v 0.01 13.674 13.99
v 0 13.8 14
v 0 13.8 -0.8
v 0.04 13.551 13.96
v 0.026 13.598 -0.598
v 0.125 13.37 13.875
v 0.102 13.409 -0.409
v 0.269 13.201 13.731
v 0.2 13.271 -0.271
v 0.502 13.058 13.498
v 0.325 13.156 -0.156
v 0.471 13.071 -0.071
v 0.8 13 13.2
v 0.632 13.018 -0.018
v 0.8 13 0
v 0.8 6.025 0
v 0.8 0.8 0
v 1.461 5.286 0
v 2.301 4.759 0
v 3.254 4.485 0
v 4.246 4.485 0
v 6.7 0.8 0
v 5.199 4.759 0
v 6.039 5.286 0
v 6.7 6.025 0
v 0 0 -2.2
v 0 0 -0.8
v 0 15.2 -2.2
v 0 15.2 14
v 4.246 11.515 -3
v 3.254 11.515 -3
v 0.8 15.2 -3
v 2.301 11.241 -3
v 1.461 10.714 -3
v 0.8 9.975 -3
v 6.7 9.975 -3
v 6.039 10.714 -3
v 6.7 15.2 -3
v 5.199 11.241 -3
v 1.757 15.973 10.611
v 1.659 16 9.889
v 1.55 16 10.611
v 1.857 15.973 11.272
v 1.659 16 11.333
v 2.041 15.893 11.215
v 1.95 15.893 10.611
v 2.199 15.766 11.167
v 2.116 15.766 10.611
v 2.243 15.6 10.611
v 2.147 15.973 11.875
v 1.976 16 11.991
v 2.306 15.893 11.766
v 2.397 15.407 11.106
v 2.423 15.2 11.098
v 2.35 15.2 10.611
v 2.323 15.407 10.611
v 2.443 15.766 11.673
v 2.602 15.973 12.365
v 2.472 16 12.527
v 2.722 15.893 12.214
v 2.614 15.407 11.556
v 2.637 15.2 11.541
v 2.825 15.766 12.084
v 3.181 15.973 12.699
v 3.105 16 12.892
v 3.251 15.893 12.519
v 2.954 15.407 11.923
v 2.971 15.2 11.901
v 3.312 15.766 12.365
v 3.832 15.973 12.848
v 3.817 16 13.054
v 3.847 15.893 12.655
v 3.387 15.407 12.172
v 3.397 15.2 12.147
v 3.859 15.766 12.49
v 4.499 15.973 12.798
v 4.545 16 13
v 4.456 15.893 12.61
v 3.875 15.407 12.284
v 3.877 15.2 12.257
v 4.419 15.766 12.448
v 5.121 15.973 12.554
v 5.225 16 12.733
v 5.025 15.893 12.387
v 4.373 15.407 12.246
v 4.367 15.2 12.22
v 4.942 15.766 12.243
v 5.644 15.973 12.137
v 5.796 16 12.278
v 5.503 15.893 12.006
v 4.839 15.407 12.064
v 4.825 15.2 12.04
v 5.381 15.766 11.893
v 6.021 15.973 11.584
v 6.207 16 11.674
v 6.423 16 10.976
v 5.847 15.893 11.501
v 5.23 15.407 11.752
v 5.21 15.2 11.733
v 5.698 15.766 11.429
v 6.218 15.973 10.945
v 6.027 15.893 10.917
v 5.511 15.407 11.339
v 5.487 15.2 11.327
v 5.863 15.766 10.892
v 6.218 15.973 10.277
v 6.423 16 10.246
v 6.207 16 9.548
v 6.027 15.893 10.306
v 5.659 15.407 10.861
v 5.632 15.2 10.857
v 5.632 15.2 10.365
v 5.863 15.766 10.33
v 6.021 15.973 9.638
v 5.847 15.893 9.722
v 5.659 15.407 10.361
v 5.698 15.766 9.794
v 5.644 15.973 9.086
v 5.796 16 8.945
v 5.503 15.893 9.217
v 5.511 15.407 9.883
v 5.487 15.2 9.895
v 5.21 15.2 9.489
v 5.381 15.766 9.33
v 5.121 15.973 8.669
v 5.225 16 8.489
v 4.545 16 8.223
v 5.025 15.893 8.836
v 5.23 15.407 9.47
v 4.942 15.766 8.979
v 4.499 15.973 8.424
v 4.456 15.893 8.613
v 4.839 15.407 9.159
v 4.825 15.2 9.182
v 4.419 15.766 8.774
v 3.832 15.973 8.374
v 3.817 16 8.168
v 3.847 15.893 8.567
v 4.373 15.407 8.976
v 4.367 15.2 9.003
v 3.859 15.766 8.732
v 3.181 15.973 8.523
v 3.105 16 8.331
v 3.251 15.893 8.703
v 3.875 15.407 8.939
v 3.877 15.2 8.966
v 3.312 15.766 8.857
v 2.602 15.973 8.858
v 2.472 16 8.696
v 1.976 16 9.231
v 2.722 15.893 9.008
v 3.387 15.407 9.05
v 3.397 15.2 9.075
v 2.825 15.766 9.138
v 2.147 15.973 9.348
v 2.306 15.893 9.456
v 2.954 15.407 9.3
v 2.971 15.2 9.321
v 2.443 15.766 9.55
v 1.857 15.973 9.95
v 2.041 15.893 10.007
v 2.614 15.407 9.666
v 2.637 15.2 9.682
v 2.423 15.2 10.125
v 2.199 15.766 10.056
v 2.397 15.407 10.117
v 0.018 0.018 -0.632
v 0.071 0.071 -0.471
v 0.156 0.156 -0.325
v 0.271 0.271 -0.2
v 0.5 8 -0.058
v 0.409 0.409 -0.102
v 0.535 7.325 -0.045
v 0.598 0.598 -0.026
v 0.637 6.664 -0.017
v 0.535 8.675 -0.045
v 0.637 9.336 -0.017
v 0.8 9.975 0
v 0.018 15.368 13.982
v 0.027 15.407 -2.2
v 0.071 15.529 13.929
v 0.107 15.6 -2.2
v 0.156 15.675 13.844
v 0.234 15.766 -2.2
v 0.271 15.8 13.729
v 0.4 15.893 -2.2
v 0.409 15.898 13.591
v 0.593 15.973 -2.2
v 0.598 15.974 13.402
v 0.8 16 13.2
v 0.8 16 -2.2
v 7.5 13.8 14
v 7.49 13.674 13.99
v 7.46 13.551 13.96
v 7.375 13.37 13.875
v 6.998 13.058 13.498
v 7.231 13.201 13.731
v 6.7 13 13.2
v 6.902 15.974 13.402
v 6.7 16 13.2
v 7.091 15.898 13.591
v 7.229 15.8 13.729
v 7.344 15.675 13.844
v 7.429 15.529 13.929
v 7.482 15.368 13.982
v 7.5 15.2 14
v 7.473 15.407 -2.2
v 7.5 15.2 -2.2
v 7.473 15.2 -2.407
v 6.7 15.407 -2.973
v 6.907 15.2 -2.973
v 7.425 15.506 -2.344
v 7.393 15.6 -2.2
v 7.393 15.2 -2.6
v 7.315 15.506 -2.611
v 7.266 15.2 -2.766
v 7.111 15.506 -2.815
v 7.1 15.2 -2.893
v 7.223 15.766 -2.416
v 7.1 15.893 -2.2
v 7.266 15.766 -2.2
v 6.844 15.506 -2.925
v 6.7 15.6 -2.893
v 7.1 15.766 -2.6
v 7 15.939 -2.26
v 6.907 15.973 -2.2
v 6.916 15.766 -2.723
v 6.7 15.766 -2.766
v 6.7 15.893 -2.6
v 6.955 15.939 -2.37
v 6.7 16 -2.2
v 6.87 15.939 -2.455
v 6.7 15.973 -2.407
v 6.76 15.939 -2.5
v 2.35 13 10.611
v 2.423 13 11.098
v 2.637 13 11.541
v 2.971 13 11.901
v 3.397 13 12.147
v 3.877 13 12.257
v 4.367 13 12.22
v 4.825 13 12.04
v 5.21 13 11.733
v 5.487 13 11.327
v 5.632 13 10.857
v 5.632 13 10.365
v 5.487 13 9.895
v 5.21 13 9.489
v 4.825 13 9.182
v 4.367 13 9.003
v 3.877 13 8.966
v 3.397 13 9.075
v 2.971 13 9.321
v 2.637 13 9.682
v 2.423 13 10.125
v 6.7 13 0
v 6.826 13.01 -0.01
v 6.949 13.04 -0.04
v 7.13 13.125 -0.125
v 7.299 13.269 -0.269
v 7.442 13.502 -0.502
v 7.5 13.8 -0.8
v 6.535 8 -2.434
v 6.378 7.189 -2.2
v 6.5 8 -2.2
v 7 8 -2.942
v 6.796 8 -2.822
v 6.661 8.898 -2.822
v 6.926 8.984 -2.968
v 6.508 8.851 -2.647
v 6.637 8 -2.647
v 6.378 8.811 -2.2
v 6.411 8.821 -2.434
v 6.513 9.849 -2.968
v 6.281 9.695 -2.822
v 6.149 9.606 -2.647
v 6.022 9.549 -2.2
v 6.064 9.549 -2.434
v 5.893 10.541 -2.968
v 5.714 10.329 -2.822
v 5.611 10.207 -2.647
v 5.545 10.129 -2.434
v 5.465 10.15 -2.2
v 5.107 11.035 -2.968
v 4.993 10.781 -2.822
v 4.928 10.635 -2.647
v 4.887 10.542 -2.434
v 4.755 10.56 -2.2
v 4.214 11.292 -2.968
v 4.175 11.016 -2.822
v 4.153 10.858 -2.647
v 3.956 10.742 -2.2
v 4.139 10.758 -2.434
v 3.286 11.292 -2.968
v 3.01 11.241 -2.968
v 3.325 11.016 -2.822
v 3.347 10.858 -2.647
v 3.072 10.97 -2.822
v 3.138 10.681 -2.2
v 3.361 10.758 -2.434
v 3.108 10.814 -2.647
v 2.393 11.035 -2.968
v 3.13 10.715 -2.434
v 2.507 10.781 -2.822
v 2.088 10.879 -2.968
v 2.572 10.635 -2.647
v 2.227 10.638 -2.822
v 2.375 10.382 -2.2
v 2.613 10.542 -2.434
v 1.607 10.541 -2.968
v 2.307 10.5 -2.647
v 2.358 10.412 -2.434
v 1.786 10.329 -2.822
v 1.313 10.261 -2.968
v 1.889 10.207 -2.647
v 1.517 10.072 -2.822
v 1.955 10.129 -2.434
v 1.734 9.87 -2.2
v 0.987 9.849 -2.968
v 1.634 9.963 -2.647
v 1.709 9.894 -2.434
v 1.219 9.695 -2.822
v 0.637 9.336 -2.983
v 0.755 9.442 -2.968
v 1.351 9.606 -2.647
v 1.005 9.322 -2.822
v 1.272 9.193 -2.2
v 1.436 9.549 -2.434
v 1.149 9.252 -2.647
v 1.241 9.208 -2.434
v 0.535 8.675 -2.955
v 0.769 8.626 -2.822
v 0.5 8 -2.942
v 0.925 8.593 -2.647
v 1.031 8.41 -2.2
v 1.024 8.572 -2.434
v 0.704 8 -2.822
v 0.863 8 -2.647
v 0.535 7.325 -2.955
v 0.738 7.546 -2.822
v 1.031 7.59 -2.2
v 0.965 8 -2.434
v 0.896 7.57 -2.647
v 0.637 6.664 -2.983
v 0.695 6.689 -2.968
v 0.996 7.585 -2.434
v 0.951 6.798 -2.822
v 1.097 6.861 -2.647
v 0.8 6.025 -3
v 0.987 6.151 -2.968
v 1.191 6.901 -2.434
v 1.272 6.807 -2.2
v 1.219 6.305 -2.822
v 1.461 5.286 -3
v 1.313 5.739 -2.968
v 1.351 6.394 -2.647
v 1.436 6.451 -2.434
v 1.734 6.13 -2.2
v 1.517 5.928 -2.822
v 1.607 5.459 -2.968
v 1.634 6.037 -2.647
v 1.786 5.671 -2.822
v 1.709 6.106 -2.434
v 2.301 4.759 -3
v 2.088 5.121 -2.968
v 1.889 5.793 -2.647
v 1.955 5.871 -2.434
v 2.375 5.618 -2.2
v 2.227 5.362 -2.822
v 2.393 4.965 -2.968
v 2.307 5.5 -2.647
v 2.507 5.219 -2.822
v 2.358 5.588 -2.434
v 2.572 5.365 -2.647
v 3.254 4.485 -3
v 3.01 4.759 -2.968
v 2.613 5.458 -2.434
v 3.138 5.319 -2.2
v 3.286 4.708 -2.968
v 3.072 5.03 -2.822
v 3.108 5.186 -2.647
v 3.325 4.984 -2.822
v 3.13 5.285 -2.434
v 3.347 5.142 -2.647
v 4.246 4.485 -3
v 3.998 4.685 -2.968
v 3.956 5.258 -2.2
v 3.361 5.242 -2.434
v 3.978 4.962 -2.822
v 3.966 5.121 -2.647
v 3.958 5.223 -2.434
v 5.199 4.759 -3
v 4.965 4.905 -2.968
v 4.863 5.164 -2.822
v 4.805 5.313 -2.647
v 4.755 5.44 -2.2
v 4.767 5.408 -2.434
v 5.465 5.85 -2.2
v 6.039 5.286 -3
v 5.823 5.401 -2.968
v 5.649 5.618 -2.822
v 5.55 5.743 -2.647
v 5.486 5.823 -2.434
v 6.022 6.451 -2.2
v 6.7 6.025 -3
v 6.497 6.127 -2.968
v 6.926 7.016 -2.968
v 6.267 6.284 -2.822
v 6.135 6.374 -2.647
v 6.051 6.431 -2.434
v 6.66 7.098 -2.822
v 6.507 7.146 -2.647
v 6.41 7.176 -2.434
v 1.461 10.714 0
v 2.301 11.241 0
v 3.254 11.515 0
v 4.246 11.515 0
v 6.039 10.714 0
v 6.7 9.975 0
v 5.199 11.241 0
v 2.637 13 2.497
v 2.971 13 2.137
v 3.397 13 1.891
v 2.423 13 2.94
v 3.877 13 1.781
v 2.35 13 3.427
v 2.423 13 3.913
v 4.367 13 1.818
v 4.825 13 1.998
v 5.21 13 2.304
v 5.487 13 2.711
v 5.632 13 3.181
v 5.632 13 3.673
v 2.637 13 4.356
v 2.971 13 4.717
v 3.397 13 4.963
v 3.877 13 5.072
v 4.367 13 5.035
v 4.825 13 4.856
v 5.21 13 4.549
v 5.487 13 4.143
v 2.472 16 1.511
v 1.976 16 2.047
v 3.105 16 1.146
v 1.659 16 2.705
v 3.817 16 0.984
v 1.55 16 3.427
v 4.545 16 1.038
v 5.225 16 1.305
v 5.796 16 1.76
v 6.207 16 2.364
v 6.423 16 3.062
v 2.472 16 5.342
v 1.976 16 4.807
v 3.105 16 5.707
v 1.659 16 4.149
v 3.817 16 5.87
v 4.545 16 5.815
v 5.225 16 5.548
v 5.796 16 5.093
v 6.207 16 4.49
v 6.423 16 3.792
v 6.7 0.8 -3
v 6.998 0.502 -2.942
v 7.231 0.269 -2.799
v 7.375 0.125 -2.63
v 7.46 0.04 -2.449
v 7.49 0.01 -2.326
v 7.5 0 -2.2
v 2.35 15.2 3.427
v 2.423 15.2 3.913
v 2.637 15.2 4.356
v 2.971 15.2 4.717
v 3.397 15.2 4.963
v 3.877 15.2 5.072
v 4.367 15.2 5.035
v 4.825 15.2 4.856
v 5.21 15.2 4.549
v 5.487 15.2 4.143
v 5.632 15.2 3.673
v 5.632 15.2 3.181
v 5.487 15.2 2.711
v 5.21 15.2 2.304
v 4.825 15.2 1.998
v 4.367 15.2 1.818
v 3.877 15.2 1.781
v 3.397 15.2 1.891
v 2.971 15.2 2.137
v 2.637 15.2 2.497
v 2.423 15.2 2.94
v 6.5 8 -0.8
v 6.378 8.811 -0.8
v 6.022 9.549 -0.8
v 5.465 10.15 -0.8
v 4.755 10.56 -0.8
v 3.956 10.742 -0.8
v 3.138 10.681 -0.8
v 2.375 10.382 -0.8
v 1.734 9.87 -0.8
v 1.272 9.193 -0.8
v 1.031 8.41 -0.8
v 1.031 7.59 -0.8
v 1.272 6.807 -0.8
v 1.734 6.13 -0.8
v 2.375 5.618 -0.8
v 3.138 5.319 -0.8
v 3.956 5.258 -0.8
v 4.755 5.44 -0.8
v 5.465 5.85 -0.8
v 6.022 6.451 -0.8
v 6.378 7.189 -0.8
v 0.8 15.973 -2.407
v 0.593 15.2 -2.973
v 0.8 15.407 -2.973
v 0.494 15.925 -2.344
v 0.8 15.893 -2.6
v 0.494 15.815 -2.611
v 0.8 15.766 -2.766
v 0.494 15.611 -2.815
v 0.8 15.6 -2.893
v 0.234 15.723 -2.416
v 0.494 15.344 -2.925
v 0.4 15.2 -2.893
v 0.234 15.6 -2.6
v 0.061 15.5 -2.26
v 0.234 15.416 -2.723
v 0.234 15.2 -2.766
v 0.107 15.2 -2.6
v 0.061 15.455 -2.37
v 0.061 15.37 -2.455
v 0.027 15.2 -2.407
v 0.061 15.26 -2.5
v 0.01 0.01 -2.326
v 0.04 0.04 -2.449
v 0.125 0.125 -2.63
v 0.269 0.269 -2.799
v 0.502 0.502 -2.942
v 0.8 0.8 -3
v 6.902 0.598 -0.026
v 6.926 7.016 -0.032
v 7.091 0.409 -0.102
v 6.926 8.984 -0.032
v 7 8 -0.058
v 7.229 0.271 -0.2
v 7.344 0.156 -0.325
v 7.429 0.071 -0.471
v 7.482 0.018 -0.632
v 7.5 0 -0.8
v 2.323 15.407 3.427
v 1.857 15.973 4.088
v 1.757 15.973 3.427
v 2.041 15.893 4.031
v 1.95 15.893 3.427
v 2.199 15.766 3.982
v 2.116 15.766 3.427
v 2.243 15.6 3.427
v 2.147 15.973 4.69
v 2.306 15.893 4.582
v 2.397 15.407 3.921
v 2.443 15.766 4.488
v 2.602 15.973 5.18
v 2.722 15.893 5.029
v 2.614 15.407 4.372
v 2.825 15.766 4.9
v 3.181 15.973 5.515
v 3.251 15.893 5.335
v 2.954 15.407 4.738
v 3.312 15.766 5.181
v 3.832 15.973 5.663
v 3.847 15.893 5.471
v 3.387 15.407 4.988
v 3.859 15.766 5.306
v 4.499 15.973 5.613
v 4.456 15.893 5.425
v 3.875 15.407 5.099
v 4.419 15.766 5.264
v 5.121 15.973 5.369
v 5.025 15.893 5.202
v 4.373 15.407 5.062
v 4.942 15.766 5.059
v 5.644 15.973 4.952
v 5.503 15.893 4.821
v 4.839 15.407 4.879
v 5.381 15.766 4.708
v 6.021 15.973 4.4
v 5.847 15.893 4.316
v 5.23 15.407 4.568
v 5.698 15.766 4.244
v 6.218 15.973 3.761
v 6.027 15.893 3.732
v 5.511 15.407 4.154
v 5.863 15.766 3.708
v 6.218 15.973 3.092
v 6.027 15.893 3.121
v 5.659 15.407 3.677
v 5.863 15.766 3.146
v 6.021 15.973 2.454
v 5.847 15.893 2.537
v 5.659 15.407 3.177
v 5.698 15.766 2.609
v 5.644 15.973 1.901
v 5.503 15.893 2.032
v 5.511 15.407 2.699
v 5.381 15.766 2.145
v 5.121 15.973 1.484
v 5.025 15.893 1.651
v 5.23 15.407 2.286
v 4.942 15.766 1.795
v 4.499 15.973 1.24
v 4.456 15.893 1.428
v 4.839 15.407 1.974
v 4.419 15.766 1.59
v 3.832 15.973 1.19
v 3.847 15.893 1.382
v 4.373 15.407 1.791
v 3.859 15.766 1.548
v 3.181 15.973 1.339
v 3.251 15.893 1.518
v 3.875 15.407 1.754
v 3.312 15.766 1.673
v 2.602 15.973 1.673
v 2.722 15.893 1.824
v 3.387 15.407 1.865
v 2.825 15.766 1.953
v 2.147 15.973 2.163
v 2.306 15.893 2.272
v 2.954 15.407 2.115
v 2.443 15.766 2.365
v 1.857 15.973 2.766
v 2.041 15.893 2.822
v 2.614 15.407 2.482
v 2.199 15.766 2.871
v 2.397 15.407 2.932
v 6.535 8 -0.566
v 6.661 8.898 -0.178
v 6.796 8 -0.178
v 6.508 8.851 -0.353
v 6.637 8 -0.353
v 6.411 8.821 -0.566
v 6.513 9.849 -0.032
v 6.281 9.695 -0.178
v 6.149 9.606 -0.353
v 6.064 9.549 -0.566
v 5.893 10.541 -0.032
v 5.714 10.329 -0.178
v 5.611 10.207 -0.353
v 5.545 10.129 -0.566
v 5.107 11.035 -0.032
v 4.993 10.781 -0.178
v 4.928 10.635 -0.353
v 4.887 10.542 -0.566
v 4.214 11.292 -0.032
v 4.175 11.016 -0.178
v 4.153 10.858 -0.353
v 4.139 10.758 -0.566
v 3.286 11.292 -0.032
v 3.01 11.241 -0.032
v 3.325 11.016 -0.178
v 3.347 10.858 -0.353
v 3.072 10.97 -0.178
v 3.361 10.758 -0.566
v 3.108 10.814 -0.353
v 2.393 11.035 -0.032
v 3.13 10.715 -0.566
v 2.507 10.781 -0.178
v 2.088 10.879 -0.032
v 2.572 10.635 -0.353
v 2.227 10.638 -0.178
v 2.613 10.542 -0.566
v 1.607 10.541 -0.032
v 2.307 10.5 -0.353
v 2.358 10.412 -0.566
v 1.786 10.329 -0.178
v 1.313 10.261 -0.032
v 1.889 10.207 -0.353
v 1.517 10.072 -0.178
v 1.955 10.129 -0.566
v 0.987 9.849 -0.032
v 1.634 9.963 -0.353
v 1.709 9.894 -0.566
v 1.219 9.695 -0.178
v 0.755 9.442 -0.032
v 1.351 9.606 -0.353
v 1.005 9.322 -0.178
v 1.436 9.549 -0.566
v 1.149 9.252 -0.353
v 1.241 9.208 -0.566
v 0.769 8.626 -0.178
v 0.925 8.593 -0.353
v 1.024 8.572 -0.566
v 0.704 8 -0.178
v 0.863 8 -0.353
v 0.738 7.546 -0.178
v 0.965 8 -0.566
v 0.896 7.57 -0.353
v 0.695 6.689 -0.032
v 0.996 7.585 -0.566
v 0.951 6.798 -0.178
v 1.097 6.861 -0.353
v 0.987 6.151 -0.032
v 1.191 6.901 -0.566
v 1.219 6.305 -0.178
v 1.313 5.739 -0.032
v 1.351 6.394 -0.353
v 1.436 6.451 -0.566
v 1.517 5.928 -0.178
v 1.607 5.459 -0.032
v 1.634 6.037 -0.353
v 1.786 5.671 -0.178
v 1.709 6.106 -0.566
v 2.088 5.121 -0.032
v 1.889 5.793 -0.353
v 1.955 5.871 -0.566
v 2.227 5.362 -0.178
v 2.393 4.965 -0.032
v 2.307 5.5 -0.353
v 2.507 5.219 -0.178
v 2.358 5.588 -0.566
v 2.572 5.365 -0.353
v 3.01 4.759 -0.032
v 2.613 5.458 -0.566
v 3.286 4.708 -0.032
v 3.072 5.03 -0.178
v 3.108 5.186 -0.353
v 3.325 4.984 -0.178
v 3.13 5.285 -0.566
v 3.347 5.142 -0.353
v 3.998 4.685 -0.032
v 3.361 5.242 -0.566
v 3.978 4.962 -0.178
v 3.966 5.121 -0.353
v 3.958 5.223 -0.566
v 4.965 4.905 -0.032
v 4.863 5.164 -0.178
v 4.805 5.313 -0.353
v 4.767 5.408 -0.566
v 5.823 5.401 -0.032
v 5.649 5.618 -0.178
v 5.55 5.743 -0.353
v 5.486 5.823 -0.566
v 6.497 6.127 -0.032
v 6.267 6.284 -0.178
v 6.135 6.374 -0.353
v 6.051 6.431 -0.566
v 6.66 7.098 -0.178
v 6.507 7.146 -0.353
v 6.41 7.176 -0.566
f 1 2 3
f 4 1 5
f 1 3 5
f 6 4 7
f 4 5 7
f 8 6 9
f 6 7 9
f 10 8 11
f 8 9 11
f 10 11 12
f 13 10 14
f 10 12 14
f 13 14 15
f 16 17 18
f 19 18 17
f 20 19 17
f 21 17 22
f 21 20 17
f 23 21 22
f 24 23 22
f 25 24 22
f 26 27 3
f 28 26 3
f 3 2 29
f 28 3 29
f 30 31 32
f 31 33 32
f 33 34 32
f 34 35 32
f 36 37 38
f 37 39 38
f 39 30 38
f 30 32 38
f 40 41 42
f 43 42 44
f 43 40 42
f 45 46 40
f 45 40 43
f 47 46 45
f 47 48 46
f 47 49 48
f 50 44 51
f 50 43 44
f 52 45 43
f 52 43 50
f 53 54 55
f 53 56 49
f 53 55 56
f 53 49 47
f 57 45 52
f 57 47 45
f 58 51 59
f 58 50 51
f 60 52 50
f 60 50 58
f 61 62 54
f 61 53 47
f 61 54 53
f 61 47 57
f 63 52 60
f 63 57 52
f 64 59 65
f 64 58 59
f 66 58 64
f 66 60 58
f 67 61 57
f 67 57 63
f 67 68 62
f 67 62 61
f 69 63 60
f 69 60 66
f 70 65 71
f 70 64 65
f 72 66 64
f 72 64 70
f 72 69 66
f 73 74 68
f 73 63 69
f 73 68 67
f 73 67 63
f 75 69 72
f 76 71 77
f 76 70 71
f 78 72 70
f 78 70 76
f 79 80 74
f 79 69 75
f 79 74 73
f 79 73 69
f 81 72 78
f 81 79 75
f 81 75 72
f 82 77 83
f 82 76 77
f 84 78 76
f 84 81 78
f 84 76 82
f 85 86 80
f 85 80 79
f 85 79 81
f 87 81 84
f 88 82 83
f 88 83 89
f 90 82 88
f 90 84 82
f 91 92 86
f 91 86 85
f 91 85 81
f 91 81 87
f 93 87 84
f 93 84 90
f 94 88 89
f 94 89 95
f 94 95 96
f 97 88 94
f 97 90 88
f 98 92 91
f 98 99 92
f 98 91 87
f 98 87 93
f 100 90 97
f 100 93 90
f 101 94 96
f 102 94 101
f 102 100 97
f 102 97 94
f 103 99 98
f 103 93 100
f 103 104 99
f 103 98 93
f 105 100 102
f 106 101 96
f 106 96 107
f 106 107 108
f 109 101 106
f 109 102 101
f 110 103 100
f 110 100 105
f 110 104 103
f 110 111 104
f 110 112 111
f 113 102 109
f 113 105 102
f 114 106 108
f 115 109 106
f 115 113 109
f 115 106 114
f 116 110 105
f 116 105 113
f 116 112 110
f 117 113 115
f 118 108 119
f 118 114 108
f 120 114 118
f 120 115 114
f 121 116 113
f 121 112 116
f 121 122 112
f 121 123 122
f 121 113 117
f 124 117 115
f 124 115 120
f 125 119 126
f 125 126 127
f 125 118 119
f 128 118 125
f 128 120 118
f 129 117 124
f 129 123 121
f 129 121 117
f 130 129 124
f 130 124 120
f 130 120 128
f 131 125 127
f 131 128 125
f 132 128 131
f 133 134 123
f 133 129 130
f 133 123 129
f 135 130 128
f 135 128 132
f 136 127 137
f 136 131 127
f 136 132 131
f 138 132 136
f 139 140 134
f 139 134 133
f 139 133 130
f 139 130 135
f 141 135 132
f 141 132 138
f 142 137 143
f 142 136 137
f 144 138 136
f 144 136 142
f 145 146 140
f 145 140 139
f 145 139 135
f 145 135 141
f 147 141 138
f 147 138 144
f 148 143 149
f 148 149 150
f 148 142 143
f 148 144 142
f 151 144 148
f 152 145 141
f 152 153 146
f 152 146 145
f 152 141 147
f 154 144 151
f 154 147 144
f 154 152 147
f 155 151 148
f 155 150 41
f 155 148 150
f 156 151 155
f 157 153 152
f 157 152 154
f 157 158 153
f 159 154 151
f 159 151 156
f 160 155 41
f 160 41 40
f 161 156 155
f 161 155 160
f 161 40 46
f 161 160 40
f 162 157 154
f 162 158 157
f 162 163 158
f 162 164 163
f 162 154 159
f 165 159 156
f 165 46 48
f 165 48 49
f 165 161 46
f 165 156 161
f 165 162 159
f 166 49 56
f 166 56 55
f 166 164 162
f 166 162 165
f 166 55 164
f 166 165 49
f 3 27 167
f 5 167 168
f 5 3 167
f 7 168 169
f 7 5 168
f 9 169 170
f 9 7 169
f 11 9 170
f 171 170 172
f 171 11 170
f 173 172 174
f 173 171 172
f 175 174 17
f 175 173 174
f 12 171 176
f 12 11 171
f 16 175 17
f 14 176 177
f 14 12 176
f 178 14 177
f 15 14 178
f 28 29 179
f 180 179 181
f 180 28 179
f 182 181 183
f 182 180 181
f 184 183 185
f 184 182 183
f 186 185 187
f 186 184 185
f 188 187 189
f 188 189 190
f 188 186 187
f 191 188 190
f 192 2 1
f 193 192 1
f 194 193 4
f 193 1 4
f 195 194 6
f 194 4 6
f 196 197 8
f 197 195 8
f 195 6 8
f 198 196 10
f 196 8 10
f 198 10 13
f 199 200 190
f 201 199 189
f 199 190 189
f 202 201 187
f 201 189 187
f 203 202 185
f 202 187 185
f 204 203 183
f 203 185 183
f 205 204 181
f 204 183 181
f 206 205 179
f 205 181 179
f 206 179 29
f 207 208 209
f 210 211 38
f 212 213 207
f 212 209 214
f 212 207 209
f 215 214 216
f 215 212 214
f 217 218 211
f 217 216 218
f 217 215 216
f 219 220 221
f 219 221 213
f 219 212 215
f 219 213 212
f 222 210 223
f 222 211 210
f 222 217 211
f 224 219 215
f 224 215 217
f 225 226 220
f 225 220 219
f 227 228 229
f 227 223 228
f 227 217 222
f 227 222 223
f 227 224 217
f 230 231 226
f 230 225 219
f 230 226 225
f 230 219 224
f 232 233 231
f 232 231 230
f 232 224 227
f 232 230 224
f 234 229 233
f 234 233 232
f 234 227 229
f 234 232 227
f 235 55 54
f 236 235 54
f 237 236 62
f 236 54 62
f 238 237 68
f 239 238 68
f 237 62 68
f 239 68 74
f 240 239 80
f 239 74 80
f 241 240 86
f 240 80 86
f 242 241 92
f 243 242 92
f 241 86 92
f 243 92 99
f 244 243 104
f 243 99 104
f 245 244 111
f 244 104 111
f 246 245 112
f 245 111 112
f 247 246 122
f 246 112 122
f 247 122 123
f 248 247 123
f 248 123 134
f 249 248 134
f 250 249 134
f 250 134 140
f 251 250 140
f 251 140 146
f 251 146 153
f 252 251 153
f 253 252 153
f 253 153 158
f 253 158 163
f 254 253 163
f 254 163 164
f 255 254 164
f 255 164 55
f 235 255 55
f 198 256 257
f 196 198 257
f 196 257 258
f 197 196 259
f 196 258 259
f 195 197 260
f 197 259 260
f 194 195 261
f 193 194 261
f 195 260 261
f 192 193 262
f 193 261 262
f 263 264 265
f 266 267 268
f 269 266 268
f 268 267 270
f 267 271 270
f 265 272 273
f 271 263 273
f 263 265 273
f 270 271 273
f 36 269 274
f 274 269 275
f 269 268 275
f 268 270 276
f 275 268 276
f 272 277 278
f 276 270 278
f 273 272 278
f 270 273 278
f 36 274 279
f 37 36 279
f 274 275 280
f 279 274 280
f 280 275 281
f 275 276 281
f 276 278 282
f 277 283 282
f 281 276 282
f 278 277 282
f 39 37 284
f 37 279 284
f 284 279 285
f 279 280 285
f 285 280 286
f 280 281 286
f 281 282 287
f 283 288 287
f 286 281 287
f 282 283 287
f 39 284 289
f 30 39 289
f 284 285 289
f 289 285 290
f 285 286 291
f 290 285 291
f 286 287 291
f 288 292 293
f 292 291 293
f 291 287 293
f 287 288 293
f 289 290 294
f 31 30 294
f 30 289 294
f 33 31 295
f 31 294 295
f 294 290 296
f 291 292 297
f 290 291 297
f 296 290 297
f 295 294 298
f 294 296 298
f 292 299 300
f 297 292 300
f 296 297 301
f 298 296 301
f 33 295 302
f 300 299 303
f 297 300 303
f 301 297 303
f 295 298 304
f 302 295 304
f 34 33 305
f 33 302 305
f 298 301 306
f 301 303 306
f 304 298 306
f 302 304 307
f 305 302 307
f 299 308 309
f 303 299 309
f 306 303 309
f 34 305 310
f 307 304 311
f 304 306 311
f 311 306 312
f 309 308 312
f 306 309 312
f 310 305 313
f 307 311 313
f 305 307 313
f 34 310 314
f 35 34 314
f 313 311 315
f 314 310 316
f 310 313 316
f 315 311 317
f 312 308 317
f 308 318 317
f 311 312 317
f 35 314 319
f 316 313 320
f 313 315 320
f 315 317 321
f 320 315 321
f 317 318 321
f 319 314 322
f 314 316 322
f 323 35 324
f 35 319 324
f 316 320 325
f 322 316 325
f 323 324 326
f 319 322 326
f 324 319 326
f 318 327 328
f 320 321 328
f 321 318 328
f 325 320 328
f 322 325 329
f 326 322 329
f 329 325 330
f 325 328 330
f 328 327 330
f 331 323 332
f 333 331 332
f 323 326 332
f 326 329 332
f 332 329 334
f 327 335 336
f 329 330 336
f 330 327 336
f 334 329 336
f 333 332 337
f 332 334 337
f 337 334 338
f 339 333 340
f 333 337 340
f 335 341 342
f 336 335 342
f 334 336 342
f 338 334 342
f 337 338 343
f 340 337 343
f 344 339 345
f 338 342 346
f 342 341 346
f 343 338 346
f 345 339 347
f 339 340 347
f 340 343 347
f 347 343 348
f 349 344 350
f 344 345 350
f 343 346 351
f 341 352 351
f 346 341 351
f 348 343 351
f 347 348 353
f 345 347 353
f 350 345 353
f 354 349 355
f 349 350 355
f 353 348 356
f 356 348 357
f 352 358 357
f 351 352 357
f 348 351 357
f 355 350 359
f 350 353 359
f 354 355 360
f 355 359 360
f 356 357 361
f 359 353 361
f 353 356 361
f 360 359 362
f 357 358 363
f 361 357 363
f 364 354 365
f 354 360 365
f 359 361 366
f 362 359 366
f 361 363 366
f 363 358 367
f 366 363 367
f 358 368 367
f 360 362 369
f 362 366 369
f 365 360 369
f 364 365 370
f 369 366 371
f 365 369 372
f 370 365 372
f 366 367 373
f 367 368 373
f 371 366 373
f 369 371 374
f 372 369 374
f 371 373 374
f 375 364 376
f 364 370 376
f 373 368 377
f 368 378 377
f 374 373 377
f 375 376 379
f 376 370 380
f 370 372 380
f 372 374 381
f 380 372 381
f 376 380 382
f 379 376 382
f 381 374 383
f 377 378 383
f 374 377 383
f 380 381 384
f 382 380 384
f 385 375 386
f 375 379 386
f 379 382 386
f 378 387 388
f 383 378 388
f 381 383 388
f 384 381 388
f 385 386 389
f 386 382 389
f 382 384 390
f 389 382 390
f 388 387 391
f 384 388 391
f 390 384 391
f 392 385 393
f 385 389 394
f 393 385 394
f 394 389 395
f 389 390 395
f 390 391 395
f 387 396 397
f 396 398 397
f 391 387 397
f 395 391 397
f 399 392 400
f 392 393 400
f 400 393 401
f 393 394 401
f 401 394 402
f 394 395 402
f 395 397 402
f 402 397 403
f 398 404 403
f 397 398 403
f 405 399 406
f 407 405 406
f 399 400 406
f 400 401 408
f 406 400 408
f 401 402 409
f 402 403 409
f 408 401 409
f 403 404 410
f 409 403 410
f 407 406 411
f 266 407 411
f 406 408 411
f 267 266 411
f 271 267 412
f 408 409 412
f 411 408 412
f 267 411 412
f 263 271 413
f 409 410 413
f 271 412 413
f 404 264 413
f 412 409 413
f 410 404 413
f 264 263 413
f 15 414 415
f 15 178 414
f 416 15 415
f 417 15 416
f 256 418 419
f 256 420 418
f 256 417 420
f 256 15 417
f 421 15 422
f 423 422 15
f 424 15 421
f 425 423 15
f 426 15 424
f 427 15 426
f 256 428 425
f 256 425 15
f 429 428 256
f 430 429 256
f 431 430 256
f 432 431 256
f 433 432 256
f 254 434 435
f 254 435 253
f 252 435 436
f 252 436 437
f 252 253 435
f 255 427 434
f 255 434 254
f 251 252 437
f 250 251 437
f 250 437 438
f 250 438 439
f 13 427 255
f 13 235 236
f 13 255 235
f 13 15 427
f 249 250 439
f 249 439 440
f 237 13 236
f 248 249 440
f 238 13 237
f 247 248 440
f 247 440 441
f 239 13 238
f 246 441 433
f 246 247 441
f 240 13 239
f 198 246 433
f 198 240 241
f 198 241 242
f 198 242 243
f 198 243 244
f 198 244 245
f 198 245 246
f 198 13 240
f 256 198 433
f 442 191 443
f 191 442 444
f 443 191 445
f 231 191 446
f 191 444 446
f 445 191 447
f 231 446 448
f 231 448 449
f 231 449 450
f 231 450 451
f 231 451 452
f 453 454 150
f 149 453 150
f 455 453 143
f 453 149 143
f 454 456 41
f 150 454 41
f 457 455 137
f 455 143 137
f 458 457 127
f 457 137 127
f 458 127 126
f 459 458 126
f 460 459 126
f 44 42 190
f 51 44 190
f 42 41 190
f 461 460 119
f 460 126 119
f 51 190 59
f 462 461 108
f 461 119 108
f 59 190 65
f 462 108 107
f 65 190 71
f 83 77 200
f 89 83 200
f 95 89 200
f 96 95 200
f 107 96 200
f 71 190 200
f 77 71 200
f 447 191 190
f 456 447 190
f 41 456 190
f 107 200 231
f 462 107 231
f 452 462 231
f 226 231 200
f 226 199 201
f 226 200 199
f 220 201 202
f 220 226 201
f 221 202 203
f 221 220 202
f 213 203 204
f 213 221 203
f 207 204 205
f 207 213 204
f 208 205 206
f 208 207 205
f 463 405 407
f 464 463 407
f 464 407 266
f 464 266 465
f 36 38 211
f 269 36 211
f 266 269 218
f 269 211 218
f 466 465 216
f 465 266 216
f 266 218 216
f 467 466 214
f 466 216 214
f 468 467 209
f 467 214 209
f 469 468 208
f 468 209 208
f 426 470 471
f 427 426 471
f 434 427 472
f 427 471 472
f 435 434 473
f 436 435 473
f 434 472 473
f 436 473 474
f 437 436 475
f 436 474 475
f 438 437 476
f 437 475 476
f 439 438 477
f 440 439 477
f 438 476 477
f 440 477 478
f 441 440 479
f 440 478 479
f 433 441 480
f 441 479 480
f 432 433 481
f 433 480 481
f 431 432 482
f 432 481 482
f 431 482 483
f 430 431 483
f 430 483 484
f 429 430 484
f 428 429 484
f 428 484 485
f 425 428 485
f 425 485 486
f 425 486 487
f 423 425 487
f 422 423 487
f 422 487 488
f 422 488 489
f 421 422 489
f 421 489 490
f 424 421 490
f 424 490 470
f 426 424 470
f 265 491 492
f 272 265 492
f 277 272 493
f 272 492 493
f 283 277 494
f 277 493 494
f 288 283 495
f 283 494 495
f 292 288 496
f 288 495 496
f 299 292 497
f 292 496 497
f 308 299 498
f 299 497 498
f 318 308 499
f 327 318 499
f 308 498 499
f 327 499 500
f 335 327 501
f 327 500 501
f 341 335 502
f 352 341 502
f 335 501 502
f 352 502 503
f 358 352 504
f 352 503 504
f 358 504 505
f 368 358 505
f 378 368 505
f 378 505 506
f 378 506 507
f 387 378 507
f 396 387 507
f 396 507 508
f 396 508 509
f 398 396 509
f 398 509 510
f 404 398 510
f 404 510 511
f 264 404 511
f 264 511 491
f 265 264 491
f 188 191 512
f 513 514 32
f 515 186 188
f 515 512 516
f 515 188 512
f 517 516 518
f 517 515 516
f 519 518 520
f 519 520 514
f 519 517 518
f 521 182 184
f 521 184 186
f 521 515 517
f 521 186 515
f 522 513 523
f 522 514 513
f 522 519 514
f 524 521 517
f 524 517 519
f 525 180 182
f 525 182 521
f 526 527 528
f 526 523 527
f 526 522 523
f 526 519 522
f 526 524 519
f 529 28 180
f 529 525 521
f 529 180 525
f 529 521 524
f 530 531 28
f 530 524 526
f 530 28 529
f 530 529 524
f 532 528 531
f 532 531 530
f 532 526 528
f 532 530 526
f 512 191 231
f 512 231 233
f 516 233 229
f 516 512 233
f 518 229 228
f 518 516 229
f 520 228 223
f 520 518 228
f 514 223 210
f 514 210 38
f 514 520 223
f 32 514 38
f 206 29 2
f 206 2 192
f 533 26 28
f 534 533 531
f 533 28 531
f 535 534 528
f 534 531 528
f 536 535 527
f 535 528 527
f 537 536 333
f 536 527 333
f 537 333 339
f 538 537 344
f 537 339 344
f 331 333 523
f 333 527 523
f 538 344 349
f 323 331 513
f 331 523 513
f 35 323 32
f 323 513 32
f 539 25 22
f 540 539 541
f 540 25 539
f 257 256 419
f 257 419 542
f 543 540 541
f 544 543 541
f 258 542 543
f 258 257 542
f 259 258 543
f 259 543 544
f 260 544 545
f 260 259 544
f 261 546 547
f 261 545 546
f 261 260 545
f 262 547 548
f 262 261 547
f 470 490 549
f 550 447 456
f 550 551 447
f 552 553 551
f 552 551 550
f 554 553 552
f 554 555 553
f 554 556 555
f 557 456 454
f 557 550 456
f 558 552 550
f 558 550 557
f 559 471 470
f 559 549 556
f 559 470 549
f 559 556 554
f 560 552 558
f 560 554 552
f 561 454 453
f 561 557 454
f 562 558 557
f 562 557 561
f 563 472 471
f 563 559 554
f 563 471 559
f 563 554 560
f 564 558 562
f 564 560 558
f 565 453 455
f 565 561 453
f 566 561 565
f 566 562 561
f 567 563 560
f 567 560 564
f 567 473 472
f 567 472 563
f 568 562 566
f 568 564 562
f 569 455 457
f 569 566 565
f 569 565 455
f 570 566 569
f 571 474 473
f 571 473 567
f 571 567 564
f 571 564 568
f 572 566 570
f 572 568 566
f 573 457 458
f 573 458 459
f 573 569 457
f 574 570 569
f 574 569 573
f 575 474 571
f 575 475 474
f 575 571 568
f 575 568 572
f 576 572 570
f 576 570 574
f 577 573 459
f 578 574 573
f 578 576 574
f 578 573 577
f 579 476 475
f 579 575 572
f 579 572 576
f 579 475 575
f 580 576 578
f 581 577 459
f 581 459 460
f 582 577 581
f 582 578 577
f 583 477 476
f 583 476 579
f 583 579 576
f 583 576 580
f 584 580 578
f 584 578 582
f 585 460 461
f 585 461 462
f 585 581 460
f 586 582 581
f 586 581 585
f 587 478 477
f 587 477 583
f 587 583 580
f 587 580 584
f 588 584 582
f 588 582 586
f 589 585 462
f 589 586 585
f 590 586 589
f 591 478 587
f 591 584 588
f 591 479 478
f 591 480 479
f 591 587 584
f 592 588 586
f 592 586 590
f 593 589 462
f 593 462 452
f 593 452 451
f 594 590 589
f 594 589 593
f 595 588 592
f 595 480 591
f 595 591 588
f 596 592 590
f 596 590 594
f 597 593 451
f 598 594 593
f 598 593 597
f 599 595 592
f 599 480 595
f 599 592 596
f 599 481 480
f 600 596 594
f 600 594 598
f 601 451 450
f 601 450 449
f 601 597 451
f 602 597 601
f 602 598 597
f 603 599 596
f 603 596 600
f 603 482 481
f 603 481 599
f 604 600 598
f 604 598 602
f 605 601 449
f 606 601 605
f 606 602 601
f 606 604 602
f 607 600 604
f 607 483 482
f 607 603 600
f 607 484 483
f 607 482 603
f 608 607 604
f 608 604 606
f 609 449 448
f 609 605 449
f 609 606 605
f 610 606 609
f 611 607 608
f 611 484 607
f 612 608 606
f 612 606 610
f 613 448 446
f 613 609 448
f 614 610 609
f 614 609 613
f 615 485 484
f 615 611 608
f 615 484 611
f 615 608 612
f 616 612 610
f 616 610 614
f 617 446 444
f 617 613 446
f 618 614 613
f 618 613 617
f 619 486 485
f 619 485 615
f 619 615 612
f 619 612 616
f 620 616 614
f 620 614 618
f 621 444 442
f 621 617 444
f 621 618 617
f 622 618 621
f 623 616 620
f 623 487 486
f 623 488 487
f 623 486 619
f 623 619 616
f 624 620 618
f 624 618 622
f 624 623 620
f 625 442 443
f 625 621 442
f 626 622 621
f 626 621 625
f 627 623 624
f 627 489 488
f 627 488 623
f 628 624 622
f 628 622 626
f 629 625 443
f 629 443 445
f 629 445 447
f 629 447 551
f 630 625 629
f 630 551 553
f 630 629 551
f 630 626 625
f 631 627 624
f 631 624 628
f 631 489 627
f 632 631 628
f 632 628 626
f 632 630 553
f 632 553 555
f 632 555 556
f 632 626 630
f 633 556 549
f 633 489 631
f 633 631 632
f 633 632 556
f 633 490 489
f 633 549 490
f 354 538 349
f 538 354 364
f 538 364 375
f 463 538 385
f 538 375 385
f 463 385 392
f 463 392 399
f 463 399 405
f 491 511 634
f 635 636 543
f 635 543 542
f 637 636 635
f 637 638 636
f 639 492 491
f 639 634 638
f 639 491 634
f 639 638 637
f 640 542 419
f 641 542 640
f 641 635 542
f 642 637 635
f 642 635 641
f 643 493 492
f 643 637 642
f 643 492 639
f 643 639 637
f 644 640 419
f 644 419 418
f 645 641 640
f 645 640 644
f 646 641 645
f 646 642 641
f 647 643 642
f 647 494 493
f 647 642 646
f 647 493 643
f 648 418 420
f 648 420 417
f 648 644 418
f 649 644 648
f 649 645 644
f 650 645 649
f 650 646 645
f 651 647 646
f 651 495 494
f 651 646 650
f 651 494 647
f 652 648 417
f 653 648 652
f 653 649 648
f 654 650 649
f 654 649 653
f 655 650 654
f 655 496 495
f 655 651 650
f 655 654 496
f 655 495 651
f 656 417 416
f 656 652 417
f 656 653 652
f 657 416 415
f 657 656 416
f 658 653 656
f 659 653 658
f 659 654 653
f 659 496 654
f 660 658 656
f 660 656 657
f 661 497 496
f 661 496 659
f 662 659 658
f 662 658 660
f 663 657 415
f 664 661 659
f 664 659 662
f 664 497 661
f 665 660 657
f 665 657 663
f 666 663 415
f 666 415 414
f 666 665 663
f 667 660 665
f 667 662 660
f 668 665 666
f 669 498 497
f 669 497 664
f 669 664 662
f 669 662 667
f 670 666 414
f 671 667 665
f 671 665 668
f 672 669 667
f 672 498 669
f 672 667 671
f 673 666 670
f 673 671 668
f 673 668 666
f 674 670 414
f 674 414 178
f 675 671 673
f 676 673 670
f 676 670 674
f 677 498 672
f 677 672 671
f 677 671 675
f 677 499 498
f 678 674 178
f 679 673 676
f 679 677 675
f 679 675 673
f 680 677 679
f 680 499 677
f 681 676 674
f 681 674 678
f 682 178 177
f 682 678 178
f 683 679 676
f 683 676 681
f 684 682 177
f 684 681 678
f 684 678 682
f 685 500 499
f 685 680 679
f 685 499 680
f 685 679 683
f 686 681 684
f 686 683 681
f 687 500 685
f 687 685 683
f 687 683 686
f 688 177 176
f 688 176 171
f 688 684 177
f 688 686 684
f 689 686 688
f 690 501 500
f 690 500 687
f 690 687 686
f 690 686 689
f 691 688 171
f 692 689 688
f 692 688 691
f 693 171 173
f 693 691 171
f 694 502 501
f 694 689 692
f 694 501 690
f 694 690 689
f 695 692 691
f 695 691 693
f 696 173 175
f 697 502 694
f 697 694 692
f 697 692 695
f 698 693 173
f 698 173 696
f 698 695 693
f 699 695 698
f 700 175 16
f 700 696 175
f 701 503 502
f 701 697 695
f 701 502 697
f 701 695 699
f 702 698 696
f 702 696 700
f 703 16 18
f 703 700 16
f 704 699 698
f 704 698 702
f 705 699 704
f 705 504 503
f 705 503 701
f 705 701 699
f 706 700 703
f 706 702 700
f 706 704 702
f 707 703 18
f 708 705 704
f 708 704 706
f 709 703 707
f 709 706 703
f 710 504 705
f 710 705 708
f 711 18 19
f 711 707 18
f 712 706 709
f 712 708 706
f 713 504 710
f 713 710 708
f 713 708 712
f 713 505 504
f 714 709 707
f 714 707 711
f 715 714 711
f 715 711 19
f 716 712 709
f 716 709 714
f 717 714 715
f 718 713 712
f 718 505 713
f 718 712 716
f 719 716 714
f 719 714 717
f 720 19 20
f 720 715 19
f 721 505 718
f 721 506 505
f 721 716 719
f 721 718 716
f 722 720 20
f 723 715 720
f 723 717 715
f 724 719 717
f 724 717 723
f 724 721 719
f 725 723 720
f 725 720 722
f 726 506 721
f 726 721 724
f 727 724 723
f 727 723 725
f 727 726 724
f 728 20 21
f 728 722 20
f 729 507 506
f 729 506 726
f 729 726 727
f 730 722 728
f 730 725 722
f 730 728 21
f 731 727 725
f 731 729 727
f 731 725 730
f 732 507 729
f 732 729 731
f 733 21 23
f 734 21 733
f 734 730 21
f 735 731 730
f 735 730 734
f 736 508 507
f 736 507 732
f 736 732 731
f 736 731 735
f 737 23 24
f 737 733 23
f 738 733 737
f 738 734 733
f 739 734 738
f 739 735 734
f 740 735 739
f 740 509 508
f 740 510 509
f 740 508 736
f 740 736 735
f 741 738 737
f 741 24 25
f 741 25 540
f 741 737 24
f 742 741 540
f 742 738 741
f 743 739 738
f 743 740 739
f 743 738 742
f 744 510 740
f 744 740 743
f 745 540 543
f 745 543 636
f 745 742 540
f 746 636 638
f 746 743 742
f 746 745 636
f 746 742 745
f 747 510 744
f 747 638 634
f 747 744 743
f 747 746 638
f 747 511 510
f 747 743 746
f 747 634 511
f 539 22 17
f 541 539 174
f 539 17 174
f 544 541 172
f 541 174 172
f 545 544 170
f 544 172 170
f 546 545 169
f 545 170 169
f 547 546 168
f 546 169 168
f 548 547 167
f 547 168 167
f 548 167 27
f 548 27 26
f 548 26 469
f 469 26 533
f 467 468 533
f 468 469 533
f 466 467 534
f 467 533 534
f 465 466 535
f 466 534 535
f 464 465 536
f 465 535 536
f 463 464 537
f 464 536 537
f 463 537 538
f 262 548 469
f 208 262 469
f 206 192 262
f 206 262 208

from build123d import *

# Parameters (mm, degrees)
F1_W         = 7.5
F1_H         = 3
F2_DEPTH     = 14
F0_W         = 7.5
F0_H         = 16
F0_R         = 2.75
F3_DEPTH     = 3
F4_R         = 1.65
F5_DEPTH     = 25
F6_T1_DEPTH  = 11.5
F6_T3_DEPTH  = 5.9
F6_T5_DEPTH  = 18.2
F6_T7_DEPTH  = 17.2
F6_T9_DEPTH  = 15
F6_T11_DEPTH = 16
F6_S15_W     = 0.8
F6_S15_H     = 0.8
F6_T16_DEPTH = 0.8
F6_S21_W     = 0.8
F6_S21_H     = 0.8
F6_T22_DEPTH = 0.8
F6_T37_DEPTH = 18
F6_T41_DEPTH = 17
F6_T48_DEPTH = 18
F6_T52_DEPTH = 17


# Not quite as in the source:
# - a fillet or chamfer that OpenCascade refuses, or shapes differently, is made with other operations: its cross-section is extruded or revolved along the edge and cut away or added


with BuildPart() as f2:
    # F1 (on face) → F2 (new body)
    with BuildSketch(Plane.XY):
        with Locations((3.75, 14.5)):
            Rectangle(F1_W, F1_H)
    extrude(amount=F2_DEPTH)

    # F0 (on Top) → F3 (join)
    with BuildSketch(Plane.XY):
        with Locations((3.75, 8)):
            Rectangle(F0_W, F0_H)
        with Locations((3.75, 8)):
            Circle(F0_R, mode=Mode.SUBTRACT)
    extrude(amount=-F3_DEPTH)

    # F4 (on face) → F5 (cut)
    with BuildSketch(Plane(origin=(0, 16, 0), x_dir=(-1, 0, 0), z_dir=(0, 1, 0))):
        with Locations((-4, 3.4267012961)):
            Circle(F4_R)
        with Locations((-4, 10.6111699715)):
            Circle(F4_R)
    extrude(amount=-F5_DEPTH, mode=Mode.SUBTRACT)

    # F6: fillet of radius 0.8 on 17 edges, made by hand

    # F6_s2 → F6_t1 (cut)
    with BuildSketch(Plane.YZ.offset(-2)):
        with BuildLine():
            ThreePointArc((16, 13.2), (15.7656854249, 13.7656854249), (15.2, 14))
            Line((15.2, 14), (16, 14))
            Line((16, 14), (16, 13.2))
        make_face()
        with BuildLine():
            ThreePointArc((13.8, 14), (13.2343145751, 13.7656854249), (13, 13.2))
            Line((13, 13.2), (13, 14))
            Line((13, 14), (13.8, 14))
        make_face()
        with BuildLine():
            ThreePointArc((0.8, 0), (0.2343145751, -0.2343145751), (0, -0.8))
            Line((0, -0.8), (0, 0))
            Line((0, 0), (0.8, 0))
        make_face()
        with BuildLine():
            ThreePointArc((0, -2.2), (0.2343145751, -2.7656854249), (0.8, -3))
            Line((0.8, -3), (0, -3))
            Line((0, -3), (0, -2.2))
        make_face()
    extrude(amount=F6_T1_DEPTH, mode=Mode.SUBTRACT)

    # F6_s4 → F6_t3 (cut)
    with BuildSketch(Plane.YZ.offset(0.8)):
        with BuildLine():
            ThreePointArc((16, -2.2), (15.7656854249, -2.7656854249), (15.2, -3))
            Line((15.2, -3), (16, -3))
            Line((16, -3), (16, -2.2))
        make_face()
    extrude(amount=F6_T3_DEPTH, mode=Mode.SUBTRACT)

    # F6_s6 → F6_t5 (cut)
    with BuildSketch(Plane.XY.offset(-2.2)):
        with BuildLine():
            ThreePointArc((0, 15.2), (0.2343145751, 15.7656854249), (0.8, 16))
            Line((0.8, 16), (0, 16))
            Line((0, 16), (0, 15.2))
        make_face()
        with BuildLine():
            ThreePointArc((6.7, 16), (7.2656854249, 15.7656854249), (7.5, 15.2))
            Line((7.5, 15.2), (7.5, 16))
            Line((7.5, 16), (6.7, 16))
        make_face()
    extrude(amount=F6_T5_DEPTH, mode=Mode.SUBTRACT)

    # F6_s8 → F6_t7 (cut)
    with BuildSketch(Plane.XZ.offset(-15.2)):
        with BuildLine():
            ThreePointArc((0, -2.2), (0.2343145751, -2.7656854249), (0.8, -3))
            Line((0.8, -3), (0, -3))
            Line((0, -3), (0, -2.2))
        make_face()
        with BuildLine():
            ThreePointArc((6.7, -3), (7.2656854249, -2.7656854249), (7.5, -2.2))
            Line((7.5, -2.2), (7.5, -3))
            Line((7.5, -3), (6.7, -3))
        make_face()
    extrude(amount=F6_T7_DEPTH, mode=Mode.SUBTRACT)

    # F6_s10 → F6_t9 (cut)
    with BuildSketch(Plane.XZ.offset(-13)):
        with BuildLine():
            ThreePointArc((0, -0.8), (0.2343145751, -0.2343145751), (0.8, 0))
            Line((0.8, 0), (0, 0))
            Line((0, 0), (0, -0.8))
        make_face()
        with BuildLine():
            ThreePointArc((6.7, 0), (7.2656854249, -0.2343145751), (7.5, -0.8))
            Line((7.5, -0.8), (7.5, 0))
            Line((7.5, 0), (6.7, 0))
        make_face()
    extrude(amount=F6_T9_DEPTH, mode=Mode.SUBTRACT)

    # F6_s12 → F6_t11 (cut)
    with BuildSketch(Plane.XY):
        with BuildLine():
            ThreePointArc((0, 13.8), (0.2343145751, 13.2343145751), (0.8, 13))
            Line((0.8, 13), (0, 13))
            Line((0, 13), (0, 13.8))
        make_face()
        with BuildLine():
            ThreePointArc((6.7, 13), (7.2656854249, 13.2343145751), (7.5, 13.8))
            Line((7.5, 13.8), (7.5, 13))
            Line((7.5, 13), (6.7, 13))
        make_face()
    extrude(amount=F6_T11_DEPTH, mode=Mode.SUBTRACT)


with BuildPart() as f6_tool14:
    # F6_s15 → F6_t16 (new body)
    with BuildSketch(Plane.XZ.offset(-15.2)):
        with Locations((7.1, -2.6)):
            Rectangle(F6_S15_W, F6_S15_H)
    extrude(amount=-F6_T16_DEPTH)

    # F6_s17 → F6_t18 (revolve, cut)
    with BuildSketch(Plane(origin=(6.7, 15.2, -2.2), x_dir=(-0.7071067812, 0, 0.7071067812), z_dir=(-0.7071067812, 0, -0.7071067812))):
        with BuildLine():
            ThreePointArc((0, -0.8), (0.8, 0), (0, 0.8))
            Line((0, 0.8), (0, -0.8))
        make_face()
    revolve(axis=Axis((6.7, 15.2, -2.2), (0, 1, 0)), mode=Mode.SUBTRACT)


with BuildPart() as f2_1:
    add(f2.part)

    # F6_t13: cut F6_tool14
    add(f6_tool14.part, mode=Mode.SUBTRACT)


with BuildPart() as f6_tool20:
    # F6_s21 → F6_t22 (new body)
    with BuildSketch(Plane.YZ.offset(0.8)):
        with Locations((15.6, -2.6)):
            Rectangle(F6_S21_W, F6_S21_H)
    extrude(amount=-F6_T22_DEPTH)

    # F6_s23 → F6_t24 (revolve, cut)
    with BuildSketch(Plane(origin=(0.8, 15.2, -2.2), x_dir=(0, -0.7071067812, 0.7071067812), z_dir=(0, -0.7071067812, -0.7071067812))):
        with BuildLine():
            ThreePointArc((0, -0.8), (0.8, 0), (0, 0.8))
            Line((0, 0.8), (0, -0.8))
        make_face()
    revolve(axis=Axis((0.8, 15.2, -2.2), (-1, 0, 0)), mode=Mode.SUBTRACT)


with BuildPart() as f2_2:
    add(f2_1.part)

    # F6_t19: cut F6_tool20
    add(f6_tool20.part, mode=Mode.SUBTRACT)

    # F6_s25 → F6_t26 (revolve, cut)
    with BuildSketch(Plane.XY.offset(10.6111699715)):
        with BuildLine():
            ThreePointArc((1.55, 16), (2.1156854249, 15.7656854249), (2.35, 15.2))
            Line((2.35, 15.2), (2.35, 16))
            Line((2.35, 16), (1.55, 16))
        make_face()
    revolve(axis=Axis((4, 16, 10.6111699715), (0, 1, 0)), mode=Mode.SUBTRACT)

    # F6_s27 → F6_t28 (revolve, cut)
    with BuildSketch(Plane.XY.offset(3.4267012961)):
        with BuildLine():
            ThreePointArc((1.55, 16), (2.1156854249, 15.7656854249), (2.35, 15.2))
            Line((2.35, 15.2), (2.35, 16))
            Line((2.35, 16), (1.55, 16))
        make_face()
    revolve(axis=Axis((4, 16, 3.4267012961), (0, 1, 0)), mode=Mode.SUBTRACT)

    # F6_s29 → F6_t30 (revolve, cut)
    with BuildSketch(Plane.XZ.offset(-8)):
        with BuildLine():
            ThreePointArc((7.3, -3), (6.7343145751, -2.7656854249), (6.5, -2.2))
            Line((6.5, -2.2), (6.5, -3))
            Line((6.5, -3), (7.3, -3))
        make_face()
    revolve(axis=Axis((3.75, 8, -3), (0, 0, 1)), mode=Mode.SUBTRACT)

    # F6_s31 → F6_t32 (revolve, cut)
    with BuildSketch(Plane.XZ.offset(-8)):
        with BuildLine():
            ThreePointArc((7.3, 0), (6.7343145751, -0.2343145751), (6.5, -0.8))
            Line((6.5, -0.8), (6.5, 0))
            Line((6.5, 0), (7.3, 0))
        make_face()
    revolve(axis=Axis((3.75, 8, 0), (0, 0, 1)), mode=Mode.SUBTRACT)


with BuildPart() as f6_tool35:
    # F6_s36 → F6_t37 (new body)
    with BuildSketch(Plane.XY.offset(-2)):
        with BuildLine():
            ThreePointArc((0, 13.8), (0.2343145751, 13.2343145751), (0.8, 13))
            Line((0.8, 13), (0, 13))
            Line((0, 13), (0, 13.8))
        make_face()
    extrude(amount=F6_T37_DEPTH)

    split(bisect_by=Plane.XY, keep=Keep.BOTTOM)


with BuildPart() as f6_tool39:
    # F6_s40 → F6_t41 (new body)
    with BuildSketch(Plane.XZ.offset(-15)):
        with BuildLine():
            ThreePointArc((0, -0.8), (0.2343145751, -0.2343145751), (0.8, 0))
            Line((0.8, 0), (0, 0))
            Line((0, 0), (0, -0.8))
        make_face()
    extrude(amount=F6_T41_DEPTH)

    split(bisect_by=Plane.XZ.offset(-13), keep=Keep.BOTTOM)


with BuildPart() as f6_tool35_1:
    add(f6_tool35.part)

    # F6_t43: intersect F6_tool39
    add(f6_tool39.part, mode=Mode.INTERSECT)


with BuildPart() as f2_3:
    add(f2_2.part)

    # F6_t33: cut F6_tool35
    add(f6_tool35_1.part, mode=Mode.SUBTRACT)


with BuildPart() as f6_tool46:
    # F6_s47 → F6_t48 (new body)
    with BuildSketch(Plane.XY.offset(-2)):
        with BuildLine():
            ThreePointArc((6.7, 13), (7.2656854249, 13.2343145751), (7.5, 13.8))
            Line((7.5, 13.8), (7.5, 13))
            Line((7.5, 13), (6.7, 13))
        make_face()
    extrude(amount=F6_T48_DEPTH)

    split(bisect_by=Plane.XY, keep=Keep.BOTTOM)


with BuildPart() as f6_tool50:
    # F6_s51 → F6_t52 (new body)
    with BuildSketch(Plane.XZ.offset(2)):
        with BuildLine():
            ThreePointArc((6.7, 0), (7.2656854249, -0.2343145751), (7.5, -0.8))
            Line((7.5, -0.8), (7.5, 0))
            Line((7.5, 0), (6.7, 0))
        make_face()
    extrude(amount=-F6_T52_DEPTH)

    split(bisect_by=Plane.XZ.offset(-13), keep=Keep.BOTTOM)


with BuildPart() as f6_tool46_1:
    add(f6_tool46.part)

    # F6_t54: intersect F6_tool50
    add(f6_tool50.part, mode=Mode.INTERSECT)


with BuildPart() as f2_4:
    add(f2_3.part)

    # F6_t44: cut F6_tool46
    add(f6_tool46_1.part, mode=Mode.SUBTRACT)


solid = f2_4.part
